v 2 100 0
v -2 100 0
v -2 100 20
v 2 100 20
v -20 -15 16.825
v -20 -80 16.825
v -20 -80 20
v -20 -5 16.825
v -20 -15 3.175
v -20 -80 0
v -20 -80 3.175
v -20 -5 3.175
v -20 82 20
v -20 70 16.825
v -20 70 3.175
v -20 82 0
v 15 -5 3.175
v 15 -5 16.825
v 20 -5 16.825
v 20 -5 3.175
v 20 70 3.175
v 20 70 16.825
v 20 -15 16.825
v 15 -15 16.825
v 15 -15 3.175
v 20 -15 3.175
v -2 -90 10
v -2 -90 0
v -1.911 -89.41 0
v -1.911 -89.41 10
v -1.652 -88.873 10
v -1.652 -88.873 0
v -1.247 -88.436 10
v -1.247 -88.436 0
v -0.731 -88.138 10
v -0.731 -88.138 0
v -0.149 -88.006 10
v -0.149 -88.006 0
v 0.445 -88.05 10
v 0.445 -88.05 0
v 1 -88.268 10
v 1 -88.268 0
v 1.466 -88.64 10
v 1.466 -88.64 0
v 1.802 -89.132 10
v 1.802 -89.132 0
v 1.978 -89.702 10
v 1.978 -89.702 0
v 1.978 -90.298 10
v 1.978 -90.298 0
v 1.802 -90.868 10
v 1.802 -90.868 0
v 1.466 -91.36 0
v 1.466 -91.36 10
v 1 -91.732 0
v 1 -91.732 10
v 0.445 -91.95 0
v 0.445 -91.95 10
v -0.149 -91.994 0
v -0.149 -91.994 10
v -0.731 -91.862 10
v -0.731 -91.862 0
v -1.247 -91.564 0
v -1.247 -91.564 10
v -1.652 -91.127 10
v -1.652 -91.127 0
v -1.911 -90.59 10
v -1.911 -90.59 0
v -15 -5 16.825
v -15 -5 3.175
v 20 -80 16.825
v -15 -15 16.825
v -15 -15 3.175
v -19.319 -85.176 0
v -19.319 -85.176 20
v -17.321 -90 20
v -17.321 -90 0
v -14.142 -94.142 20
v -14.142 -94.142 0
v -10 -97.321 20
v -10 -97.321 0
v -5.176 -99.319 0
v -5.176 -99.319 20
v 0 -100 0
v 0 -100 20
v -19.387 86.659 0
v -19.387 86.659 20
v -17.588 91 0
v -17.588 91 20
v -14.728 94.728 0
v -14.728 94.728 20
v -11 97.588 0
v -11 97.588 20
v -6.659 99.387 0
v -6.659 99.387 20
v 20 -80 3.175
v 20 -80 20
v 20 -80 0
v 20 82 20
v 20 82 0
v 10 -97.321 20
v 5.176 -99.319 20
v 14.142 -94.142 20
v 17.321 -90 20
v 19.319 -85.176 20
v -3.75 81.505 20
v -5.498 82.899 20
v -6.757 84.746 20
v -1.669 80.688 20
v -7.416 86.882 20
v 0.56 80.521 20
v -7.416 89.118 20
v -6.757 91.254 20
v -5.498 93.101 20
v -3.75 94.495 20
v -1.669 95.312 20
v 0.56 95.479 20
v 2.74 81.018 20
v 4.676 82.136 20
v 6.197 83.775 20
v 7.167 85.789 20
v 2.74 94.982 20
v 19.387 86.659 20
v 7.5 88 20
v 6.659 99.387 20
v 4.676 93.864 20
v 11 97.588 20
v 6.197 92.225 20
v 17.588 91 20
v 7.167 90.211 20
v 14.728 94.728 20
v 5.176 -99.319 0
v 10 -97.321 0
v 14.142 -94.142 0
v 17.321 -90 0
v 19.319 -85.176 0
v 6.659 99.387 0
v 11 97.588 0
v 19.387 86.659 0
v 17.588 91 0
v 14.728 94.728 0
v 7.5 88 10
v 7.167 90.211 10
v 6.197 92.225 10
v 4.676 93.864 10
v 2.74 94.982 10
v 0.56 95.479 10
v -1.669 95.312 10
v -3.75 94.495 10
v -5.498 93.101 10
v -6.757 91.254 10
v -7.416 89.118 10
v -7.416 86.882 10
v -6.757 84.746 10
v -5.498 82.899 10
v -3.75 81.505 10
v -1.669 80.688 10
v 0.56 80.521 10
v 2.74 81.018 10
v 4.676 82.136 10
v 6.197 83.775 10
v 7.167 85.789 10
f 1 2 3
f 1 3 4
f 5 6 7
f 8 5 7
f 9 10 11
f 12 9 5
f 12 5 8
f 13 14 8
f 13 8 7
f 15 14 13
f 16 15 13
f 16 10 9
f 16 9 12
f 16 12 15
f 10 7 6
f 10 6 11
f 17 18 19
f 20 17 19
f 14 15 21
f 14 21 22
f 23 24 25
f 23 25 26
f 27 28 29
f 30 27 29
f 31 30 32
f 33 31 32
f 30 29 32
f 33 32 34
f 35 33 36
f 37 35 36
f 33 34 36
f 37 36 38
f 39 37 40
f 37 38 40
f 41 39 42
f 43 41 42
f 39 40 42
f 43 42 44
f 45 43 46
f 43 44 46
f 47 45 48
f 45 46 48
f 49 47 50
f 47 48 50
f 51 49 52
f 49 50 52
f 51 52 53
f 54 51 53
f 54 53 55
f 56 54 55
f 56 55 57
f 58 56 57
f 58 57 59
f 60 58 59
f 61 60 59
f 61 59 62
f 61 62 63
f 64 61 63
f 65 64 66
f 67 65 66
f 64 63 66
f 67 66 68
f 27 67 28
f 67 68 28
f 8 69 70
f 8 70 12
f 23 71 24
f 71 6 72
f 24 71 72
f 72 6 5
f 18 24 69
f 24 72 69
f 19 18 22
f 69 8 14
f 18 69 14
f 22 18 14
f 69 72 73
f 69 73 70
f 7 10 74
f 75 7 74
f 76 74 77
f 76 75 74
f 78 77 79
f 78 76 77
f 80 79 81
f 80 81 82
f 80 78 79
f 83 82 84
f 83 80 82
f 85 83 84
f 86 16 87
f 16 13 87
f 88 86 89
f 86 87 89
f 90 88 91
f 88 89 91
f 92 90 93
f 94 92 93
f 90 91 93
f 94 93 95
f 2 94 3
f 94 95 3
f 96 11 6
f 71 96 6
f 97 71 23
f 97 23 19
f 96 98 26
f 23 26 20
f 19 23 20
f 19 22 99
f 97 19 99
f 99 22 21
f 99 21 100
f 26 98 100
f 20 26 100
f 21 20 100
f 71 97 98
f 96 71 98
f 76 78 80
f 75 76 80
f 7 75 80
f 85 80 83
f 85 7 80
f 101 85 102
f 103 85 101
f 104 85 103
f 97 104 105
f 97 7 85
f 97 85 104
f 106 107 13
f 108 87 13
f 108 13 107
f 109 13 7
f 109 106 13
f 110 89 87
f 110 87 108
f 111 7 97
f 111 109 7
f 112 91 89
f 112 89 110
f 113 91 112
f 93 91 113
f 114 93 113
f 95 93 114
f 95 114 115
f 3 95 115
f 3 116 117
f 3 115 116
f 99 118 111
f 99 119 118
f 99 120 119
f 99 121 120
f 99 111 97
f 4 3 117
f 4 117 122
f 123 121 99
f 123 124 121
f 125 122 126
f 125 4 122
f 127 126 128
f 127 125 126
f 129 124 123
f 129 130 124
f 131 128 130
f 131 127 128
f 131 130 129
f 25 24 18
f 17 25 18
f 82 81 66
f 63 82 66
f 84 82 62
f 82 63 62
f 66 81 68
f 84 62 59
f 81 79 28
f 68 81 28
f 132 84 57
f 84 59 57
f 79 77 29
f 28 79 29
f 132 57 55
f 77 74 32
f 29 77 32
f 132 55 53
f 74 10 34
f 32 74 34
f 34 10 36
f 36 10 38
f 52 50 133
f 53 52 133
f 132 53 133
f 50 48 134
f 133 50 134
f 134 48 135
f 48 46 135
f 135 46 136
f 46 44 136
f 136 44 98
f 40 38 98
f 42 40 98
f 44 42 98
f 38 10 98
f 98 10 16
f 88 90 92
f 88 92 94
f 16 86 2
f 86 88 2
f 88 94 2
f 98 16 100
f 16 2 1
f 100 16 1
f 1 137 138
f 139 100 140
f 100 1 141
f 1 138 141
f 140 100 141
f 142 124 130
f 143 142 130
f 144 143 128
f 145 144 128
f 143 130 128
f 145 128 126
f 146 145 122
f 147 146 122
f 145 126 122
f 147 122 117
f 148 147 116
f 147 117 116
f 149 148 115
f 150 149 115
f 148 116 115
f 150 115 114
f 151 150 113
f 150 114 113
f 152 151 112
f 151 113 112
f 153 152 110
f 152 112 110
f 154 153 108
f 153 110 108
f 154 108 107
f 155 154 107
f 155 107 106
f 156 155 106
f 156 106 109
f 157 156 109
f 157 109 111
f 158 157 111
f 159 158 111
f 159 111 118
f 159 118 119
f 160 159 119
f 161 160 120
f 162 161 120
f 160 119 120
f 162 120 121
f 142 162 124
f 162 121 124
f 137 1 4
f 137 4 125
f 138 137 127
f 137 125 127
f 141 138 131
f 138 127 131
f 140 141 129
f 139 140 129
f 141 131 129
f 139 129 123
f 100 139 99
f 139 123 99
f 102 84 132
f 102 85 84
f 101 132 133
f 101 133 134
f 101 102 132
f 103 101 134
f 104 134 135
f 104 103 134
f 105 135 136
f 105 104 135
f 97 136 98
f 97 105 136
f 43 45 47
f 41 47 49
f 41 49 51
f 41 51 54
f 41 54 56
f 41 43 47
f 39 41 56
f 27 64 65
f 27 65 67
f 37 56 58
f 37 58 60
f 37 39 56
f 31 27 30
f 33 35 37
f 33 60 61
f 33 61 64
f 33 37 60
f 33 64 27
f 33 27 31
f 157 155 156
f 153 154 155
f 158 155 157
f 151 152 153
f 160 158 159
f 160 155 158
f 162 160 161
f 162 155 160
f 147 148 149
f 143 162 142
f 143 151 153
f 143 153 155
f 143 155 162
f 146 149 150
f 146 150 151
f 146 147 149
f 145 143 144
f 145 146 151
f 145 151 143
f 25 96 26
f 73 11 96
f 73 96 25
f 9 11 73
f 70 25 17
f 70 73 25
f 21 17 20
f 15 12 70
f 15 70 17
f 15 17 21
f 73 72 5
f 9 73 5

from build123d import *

# Parameters (mm, degrees)
SKETCH2_W           = 40
SKETCH2_H           = 200
BOSS_EXTRUDE1_DEPTH = 20
SKETCH3_R           = 2
CUT_EXTRUDE1_DEPTH  = 10
FILLET1_R           = 20
SKETCH5_R           = 7.5
CUT_EXTRUDE3_DEPTH  = 10
FILLET2_R           = 18
SKETCH6_W           = 13.65
SKETCH6_H           = 150
CUT_EXTRUDE4_DEPTH  = 110.544511501
SKETCH7_W           = 5
SKETCH7_H           = 10
BOSS_EXTRUDE2_DEPTH = 15


with BuildPart() as part:
    # Sketch2 → Boss-Extrude1 (new body)
    with BuildSketch(Plane.XY):
        Rectangle(SKETCH2_W, SKETCH2_H)
    extrude(amount=BOSS_EXTRUDE1_DEPTH)

    # Sketch3 → Cut-Extrude1 (cut)
    with BuildSketch(Plane(origin=(0, 0, 0), x_dir=(-1, 0, 0), z_dir=(0, 0, -1))):
        with Locations((0, -90)):
            Circle(SKETCH3_R)
    extrude(amount=-CUT_EXTRUDE1_DEPTH, mode=Mode.SUBTRACT)

    # Fillet1
    fillet1_edges = [part.edges().sort_by_distance(p)[0] for p in [
        (20, -100, 10),
        (-20, -100, 10),
    ]]
    fillet(fillet1_edges, radius=FILLET1_R - 0.0001)  # a hair under: the kernel refuses the full size

    # Sketch5 → Cut-Extrude3 (cut)
    with BuildSketch(Plane.XY.offset(20)):
        with Locations((0, 88)):
            Circle(SKETCH5_R)
    extrude(amount=-CUT_EXTRUDE3_DEPTH, mode=Mode.SUBTRACT)

    # Fillet2
    fillet2_edges = [part.edges().sort_by_distance(p)[0] for p in [
        (-20, 100, 10),
        (20, 100, 10),
    ]]
    fillet(fillet2_edges, radius=FILLET2_R)

    # Sketch6 → Cut-Extrude4 (cut, through all)
    with BuildSketch(Plane.ZY.offset(20)):
        with Locations((10, -5)):
            Rectangle(SKETCH6_W, SKETCH6_H)
    extrude(amount=-CUT_EXTRUDE4_DEPTH, mode=Mode.SUBTRACT)

    # Sketch7 → Boss-Extrude2 (add)
    with BuildSketch(Plane(origin=(0, 0, 16.825), x_dir=(-1, 0, 0), z_dir=(0, 0, -1))):
        with Locations((17.5, -10)):
            Rectangle(SKETCH7_W, SKETCH7_H)
    boss_extrude2 = extrude(amount=BOSS_EXTRUDE2_DEPTH)

    # Mirror1: Boss-Extrude2 across plane
    add(boss_extrude2.mirror(Plane(origin=(0, 0, 0), x_dir=(0, 0, 1), z_dir=(1, 0, 0))))


solid = part.part
